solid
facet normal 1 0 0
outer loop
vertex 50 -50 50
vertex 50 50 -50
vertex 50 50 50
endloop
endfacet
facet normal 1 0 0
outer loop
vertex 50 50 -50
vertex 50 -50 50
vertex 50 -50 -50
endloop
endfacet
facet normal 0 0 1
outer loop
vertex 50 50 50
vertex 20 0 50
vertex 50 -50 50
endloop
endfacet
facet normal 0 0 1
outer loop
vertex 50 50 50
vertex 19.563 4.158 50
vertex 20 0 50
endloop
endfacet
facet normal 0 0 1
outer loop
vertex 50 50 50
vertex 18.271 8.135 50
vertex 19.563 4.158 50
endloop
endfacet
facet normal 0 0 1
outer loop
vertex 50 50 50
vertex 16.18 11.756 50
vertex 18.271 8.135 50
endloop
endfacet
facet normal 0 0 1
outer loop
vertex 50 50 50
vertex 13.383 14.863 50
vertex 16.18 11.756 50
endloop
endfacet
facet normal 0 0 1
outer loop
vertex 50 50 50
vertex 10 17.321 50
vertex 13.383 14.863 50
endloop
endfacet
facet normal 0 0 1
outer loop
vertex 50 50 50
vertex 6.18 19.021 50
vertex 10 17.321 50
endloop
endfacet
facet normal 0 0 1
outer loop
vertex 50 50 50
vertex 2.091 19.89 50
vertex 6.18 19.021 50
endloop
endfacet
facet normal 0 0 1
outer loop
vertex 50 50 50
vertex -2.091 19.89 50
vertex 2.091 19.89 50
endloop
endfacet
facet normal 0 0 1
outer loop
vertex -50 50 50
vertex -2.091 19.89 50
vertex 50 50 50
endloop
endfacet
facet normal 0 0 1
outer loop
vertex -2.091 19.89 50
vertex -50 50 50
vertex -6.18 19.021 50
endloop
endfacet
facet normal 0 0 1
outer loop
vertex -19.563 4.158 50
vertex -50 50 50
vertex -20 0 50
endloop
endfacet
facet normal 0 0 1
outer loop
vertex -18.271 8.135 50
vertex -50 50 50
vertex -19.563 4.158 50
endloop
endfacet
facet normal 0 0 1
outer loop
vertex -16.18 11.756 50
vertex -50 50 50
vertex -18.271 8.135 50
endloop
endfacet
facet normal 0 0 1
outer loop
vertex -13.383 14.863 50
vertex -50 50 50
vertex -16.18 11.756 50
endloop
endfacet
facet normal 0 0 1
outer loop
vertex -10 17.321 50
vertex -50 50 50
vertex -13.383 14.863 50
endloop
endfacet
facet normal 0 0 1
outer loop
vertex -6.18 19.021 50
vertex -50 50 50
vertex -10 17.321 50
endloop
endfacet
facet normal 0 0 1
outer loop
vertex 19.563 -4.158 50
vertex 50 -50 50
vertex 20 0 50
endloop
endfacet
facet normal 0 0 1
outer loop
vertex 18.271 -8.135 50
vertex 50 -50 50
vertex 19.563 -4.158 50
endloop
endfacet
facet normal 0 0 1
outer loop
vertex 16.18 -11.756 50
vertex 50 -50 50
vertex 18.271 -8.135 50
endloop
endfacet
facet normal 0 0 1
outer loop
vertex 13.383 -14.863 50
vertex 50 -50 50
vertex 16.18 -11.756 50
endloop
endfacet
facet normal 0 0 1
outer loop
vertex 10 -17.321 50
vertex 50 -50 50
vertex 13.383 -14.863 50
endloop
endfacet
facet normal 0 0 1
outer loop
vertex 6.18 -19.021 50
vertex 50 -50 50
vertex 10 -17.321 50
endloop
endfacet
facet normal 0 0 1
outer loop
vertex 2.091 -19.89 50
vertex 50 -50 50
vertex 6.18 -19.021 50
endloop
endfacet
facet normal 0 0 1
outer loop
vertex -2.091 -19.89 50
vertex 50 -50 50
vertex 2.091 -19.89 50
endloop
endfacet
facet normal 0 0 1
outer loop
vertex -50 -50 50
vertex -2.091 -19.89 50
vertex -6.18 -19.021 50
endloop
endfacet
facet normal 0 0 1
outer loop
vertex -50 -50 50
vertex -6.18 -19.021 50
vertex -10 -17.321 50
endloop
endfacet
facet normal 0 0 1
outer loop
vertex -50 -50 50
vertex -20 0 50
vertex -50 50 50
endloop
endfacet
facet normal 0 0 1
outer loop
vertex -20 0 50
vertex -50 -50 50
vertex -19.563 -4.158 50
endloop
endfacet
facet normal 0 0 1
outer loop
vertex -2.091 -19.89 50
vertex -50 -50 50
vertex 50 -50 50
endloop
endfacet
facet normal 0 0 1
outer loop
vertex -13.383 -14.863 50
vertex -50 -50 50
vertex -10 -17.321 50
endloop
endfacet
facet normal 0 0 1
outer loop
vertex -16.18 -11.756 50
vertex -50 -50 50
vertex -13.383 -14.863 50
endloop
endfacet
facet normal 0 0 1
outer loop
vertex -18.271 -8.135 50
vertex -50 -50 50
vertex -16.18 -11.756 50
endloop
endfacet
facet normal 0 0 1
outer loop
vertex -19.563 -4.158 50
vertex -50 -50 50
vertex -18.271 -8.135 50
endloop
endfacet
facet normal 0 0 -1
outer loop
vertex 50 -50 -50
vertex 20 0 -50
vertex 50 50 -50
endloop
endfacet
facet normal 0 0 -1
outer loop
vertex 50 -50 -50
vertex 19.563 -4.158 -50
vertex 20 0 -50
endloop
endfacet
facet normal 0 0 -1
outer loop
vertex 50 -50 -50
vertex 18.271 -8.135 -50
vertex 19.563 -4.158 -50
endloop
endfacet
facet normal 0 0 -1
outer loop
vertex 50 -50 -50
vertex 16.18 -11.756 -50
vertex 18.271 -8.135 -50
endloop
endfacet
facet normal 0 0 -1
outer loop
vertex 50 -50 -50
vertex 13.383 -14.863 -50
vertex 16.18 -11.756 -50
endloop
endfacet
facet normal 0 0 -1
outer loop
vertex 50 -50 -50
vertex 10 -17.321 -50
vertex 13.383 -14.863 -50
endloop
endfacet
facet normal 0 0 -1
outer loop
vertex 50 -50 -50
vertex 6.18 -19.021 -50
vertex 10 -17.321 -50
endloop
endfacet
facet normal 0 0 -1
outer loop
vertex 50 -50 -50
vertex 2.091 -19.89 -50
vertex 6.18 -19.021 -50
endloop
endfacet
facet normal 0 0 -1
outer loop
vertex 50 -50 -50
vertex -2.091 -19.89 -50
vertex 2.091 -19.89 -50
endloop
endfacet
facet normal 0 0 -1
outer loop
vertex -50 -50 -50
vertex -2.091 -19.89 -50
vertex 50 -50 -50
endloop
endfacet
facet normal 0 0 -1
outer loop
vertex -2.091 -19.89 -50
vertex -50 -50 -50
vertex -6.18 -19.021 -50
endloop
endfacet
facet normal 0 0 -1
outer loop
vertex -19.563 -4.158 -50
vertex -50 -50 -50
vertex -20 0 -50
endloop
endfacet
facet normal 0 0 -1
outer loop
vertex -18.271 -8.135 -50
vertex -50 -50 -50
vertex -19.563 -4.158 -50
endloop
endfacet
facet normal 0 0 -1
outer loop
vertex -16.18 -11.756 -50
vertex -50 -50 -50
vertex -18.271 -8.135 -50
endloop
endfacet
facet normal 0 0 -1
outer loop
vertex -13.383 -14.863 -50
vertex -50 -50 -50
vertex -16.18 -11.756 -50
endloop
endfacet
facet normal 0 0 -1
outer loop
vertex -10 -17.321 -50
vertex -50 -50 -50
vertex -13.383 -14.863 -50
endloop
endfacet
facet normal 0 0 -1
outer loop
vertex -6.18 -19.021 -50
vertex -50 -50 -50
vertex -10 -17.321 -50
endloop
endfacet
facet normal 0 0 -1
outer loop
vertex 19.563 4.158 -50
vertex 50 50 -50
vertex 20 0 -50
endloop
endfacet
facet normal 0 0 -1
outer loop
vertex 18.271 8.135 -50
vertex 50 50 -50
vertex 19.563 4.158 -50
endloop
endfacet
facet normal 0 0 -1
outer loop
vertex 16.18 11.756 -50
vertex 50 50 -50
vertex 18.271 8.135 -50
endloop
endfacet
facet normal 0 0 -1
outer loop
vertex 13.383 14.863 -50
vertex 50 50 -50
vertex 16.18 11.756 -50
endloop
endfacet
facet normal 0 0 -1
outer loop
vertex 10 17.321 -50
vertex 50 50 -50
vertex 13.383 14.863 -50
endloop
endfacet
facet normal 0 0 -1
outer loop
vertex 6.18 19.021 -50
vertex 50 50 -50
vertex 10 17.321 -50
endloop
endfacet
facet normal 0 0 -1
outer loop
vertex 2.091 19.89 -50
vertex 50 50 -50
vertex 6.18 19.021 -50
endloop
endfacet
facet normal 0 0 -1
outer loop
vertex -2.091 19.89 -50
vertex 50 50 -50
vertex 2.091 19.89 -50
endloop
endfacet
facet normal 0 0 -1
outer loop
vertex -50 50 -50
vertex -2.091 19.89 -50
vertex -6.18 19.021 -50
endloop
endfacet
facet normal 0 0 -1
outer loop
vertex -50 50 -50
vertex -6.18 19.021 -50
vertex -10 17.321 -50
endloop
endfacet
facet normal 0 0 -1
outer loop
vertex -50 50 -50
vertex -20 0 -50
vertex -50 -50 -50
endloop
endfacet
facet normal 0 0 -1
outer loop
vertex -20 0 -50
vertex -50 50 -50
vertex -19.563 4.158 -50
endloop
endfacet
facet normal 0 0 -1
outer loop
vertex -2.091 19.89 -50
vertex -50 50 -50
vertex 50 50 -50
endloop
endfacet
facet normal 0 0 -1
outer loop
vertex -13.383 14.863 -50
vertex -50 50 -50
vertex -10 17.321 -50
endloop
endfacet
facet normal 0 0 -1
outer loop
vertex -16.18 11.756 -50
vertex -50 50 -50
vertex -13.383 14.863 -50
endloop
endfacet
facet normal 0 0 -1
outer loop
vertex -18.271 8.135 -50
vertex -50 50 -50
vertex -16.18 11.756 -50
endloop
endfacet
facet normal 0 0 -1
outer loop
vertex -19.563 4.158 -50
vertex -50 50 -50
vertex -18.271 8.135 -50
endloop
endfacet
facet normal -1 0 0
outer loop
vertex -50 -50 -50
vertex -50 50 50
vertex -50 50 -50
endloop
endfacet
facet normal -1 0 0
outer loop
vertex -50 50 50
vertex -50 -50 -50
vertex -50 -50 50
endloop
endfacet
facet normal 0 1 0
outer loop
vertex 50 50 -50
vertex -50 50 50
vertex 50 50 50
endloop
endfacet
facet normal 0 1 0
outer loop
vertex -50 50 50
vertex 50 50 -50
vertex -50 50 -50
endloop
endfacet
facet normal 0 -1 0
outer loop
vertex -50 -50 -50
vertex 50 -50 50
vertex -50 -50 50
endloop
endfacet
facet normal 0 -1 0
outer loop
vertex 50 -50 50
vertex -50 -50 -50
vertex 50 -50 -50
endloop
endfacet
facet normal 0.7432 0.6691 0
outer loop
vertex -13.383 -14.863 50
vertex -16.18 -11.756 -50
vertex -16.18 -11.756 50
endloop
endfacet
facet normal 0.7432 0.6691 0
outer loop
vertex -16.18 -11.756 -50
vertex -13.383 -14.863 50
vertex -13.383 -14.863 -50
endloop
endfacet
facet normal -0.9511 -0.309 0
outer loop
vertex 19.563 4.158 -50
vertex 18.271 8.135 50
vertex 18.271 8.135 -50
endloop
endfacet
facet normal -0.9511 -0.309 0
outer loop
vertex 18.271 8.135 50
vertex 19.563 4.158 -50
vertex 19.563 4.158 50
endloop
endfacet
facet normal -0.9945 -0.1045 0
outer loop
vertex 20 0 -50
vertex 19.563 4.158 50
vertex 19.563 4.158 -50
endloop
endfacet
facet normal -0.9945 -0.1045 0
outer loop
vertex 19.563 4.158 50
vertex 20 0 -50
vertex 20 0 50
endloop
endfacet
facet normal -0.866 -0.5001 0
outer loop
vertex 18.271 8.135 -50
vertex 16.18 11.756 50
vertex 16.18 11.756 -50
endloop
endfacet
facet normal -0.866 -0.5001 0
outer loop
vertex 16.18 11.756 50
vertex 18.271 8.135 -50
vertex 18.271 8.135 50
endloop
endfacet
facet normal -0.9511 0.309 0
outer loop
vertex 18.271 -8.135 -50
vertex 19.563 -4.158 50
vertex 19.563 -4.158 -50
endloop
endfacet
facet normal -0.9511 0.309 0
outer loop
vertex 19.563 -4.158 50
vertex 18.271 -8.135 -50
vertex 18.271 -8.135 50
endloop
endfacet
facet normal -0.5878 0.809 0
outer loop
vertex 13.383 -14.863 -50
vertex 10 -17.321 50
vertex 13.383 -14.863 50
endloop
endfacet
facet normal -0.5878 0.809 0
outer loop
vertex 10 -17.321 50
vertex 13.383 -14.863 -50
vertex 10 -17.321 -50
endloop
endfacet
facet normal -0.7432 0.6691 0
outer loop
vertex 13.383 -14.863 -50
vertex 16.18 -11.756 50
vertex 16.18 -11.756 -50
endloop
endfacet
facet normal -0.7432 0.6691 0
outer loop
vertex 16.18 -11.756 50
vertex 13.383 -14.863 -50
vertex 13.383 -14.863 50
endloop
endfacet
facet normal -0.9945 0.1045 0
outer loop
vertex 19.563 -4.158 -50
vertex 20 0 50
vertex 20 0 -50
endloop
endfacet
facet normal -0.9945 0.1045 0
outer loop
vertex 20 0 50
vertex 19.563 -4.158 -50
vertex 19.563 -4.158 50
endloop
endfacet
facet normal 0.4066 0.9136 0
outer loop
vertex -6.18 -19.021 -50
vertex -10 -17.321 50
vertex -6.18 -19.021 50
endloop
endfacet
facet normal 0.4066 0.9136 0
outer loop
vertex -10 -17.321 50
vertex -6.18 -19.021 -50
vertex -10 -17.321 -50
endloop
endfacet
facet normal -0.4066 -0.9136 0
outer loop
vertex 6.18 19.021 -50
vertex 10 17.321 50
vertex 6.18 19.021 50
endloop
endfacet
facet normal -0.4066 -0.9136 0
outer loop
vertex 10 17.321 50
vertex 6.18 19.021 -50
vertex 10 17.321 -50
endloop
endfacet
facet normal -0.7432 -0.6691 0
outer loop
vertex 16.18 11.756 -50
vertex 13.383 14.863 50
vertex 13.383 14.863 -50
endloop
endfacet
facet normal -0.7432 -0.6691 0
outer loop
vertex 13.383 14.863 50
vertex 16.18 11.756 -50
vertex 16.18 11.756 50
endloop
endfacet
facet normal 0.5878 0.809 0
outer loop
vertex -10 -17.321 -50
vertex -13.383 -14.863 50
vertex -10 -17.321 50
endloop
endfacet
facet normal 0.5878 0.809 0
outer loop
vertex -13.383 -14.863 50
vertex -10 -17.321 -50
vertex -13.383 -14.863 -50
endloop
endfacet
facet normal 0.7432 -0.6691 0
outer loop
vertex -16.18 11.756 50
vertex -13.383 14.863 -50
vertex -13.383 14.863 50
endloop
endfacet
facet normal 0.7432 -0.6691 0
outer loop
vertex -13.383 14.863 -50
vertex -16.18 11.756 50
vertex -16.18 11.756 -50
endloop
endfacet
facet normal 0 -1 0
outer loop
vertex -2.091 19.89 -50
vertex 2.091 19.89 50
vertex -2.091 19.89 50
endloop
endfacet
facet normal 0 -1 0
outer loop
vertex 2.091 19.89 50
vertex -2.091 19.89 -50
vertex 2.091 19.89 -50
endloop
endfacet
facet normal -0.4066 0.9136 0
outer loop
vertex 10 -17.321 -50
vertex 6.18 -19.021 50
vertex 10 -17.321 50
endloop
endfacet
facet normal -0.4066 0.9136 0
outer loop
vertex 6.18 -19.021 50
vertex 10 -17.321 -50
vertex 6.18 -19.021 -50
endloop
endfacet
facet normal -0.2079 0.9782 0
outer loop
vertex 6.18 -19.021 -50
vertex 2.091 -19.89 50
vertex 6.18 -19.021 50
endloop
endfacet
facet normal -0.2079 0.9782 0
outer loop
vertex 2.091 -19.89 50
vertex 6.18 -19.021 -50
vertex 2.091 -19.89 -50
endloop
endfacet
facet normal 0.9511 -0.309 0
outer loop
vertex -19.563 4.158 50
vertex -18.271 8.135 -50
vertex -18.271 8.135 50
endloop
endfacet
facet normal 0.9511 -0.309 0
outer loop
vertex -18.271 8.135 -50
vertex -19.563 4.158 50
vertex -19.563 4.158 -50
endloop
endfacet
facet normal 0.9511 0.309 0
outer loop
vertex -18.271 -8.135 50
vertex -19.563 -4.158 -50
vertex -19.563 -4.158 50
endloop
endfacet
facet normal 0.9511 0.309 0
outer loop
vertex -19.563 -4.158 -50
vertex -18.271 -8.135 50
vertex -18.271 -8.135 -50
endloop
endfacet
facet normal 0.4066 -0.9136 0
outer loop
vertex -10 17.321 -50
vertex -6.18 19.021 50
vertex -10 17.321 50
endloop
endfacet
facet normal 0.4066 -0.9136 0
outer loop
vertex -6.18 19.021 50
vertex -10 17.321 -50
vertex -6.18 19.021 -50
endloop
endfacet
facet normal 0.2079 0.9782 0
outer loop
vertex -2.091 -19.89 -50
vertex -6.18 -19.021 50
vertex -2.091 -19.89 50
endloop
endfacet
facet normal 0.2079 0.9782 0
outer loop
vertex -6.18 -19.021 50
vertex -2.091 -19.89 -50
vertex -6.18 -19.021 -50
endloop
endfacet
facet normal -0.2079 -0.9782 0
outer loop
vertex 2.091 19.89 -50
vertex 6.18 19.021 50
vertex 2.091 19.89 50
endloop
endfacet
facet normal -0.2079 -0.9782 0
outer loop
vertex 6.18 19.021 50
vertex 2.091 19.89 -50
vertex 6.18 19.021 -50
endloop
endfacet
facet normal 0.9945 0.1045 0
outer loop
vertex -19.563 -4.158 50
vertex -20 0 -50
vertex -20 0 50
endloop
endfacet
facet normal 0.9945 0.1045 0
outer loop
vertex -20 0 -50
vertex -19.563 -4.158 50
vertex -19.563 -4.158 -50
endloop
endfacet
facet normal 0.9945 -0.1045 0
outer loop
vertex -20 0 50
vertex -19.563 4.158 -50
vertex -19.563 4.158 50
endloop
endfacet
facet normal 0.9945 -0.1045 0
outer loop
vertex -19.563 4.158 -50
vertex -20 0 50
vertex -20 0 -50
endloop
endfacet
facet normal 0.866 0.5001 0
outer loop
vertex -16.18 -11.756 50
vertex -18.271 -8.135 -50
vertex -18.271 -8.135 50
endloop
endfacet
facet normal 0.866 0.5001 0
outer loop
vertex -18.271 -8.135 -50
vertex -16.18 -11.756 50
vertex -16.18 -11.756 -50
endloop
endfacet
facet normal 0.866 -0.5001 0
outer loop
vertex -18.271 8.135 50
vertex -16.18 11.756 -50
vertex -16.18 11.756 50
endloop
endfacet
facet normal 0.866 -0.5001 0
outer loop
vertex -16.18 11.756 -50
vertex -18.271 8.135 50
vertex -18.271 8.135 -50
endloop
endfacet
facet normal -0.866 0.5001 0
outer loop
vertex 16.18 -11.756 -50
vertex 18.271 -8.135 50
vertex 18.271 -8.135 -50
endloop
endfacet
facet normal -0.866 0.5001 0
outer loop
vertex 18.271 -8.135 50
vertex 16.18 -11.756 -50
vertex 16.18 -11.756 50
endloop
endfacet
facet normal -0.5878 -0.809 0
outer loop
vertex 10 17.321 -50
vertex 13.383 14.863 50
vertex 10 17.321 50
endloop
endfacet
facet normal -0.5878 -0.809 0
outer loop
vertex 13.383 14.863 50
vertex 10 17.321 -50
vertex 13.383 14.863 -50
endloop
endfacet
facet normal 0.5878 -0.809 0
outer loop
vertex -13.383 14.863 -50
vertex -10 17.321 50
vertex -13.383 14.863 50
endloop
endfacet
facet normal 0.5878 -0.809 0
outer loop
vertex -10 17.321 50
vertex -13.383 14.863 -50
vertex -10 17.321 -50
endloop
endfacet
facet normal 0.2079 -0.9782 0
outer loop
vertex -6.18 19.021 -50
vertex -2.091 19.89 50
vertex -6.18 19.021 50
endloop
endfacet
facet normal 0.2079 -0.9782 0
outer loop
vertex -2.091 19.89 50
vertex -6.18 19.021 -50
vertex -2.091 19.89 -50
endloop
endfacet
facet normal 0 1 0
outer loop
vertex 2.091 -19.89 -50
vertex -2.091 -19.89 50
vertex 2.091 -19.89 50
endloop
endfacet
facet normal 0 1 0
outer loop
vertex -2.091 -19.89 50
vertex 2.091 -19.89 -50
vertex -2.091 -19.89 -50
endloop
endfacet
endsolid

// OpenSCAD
difference(){
cube([100,100,100],center = true);
cylinder(r=20,120,center = true);
}
